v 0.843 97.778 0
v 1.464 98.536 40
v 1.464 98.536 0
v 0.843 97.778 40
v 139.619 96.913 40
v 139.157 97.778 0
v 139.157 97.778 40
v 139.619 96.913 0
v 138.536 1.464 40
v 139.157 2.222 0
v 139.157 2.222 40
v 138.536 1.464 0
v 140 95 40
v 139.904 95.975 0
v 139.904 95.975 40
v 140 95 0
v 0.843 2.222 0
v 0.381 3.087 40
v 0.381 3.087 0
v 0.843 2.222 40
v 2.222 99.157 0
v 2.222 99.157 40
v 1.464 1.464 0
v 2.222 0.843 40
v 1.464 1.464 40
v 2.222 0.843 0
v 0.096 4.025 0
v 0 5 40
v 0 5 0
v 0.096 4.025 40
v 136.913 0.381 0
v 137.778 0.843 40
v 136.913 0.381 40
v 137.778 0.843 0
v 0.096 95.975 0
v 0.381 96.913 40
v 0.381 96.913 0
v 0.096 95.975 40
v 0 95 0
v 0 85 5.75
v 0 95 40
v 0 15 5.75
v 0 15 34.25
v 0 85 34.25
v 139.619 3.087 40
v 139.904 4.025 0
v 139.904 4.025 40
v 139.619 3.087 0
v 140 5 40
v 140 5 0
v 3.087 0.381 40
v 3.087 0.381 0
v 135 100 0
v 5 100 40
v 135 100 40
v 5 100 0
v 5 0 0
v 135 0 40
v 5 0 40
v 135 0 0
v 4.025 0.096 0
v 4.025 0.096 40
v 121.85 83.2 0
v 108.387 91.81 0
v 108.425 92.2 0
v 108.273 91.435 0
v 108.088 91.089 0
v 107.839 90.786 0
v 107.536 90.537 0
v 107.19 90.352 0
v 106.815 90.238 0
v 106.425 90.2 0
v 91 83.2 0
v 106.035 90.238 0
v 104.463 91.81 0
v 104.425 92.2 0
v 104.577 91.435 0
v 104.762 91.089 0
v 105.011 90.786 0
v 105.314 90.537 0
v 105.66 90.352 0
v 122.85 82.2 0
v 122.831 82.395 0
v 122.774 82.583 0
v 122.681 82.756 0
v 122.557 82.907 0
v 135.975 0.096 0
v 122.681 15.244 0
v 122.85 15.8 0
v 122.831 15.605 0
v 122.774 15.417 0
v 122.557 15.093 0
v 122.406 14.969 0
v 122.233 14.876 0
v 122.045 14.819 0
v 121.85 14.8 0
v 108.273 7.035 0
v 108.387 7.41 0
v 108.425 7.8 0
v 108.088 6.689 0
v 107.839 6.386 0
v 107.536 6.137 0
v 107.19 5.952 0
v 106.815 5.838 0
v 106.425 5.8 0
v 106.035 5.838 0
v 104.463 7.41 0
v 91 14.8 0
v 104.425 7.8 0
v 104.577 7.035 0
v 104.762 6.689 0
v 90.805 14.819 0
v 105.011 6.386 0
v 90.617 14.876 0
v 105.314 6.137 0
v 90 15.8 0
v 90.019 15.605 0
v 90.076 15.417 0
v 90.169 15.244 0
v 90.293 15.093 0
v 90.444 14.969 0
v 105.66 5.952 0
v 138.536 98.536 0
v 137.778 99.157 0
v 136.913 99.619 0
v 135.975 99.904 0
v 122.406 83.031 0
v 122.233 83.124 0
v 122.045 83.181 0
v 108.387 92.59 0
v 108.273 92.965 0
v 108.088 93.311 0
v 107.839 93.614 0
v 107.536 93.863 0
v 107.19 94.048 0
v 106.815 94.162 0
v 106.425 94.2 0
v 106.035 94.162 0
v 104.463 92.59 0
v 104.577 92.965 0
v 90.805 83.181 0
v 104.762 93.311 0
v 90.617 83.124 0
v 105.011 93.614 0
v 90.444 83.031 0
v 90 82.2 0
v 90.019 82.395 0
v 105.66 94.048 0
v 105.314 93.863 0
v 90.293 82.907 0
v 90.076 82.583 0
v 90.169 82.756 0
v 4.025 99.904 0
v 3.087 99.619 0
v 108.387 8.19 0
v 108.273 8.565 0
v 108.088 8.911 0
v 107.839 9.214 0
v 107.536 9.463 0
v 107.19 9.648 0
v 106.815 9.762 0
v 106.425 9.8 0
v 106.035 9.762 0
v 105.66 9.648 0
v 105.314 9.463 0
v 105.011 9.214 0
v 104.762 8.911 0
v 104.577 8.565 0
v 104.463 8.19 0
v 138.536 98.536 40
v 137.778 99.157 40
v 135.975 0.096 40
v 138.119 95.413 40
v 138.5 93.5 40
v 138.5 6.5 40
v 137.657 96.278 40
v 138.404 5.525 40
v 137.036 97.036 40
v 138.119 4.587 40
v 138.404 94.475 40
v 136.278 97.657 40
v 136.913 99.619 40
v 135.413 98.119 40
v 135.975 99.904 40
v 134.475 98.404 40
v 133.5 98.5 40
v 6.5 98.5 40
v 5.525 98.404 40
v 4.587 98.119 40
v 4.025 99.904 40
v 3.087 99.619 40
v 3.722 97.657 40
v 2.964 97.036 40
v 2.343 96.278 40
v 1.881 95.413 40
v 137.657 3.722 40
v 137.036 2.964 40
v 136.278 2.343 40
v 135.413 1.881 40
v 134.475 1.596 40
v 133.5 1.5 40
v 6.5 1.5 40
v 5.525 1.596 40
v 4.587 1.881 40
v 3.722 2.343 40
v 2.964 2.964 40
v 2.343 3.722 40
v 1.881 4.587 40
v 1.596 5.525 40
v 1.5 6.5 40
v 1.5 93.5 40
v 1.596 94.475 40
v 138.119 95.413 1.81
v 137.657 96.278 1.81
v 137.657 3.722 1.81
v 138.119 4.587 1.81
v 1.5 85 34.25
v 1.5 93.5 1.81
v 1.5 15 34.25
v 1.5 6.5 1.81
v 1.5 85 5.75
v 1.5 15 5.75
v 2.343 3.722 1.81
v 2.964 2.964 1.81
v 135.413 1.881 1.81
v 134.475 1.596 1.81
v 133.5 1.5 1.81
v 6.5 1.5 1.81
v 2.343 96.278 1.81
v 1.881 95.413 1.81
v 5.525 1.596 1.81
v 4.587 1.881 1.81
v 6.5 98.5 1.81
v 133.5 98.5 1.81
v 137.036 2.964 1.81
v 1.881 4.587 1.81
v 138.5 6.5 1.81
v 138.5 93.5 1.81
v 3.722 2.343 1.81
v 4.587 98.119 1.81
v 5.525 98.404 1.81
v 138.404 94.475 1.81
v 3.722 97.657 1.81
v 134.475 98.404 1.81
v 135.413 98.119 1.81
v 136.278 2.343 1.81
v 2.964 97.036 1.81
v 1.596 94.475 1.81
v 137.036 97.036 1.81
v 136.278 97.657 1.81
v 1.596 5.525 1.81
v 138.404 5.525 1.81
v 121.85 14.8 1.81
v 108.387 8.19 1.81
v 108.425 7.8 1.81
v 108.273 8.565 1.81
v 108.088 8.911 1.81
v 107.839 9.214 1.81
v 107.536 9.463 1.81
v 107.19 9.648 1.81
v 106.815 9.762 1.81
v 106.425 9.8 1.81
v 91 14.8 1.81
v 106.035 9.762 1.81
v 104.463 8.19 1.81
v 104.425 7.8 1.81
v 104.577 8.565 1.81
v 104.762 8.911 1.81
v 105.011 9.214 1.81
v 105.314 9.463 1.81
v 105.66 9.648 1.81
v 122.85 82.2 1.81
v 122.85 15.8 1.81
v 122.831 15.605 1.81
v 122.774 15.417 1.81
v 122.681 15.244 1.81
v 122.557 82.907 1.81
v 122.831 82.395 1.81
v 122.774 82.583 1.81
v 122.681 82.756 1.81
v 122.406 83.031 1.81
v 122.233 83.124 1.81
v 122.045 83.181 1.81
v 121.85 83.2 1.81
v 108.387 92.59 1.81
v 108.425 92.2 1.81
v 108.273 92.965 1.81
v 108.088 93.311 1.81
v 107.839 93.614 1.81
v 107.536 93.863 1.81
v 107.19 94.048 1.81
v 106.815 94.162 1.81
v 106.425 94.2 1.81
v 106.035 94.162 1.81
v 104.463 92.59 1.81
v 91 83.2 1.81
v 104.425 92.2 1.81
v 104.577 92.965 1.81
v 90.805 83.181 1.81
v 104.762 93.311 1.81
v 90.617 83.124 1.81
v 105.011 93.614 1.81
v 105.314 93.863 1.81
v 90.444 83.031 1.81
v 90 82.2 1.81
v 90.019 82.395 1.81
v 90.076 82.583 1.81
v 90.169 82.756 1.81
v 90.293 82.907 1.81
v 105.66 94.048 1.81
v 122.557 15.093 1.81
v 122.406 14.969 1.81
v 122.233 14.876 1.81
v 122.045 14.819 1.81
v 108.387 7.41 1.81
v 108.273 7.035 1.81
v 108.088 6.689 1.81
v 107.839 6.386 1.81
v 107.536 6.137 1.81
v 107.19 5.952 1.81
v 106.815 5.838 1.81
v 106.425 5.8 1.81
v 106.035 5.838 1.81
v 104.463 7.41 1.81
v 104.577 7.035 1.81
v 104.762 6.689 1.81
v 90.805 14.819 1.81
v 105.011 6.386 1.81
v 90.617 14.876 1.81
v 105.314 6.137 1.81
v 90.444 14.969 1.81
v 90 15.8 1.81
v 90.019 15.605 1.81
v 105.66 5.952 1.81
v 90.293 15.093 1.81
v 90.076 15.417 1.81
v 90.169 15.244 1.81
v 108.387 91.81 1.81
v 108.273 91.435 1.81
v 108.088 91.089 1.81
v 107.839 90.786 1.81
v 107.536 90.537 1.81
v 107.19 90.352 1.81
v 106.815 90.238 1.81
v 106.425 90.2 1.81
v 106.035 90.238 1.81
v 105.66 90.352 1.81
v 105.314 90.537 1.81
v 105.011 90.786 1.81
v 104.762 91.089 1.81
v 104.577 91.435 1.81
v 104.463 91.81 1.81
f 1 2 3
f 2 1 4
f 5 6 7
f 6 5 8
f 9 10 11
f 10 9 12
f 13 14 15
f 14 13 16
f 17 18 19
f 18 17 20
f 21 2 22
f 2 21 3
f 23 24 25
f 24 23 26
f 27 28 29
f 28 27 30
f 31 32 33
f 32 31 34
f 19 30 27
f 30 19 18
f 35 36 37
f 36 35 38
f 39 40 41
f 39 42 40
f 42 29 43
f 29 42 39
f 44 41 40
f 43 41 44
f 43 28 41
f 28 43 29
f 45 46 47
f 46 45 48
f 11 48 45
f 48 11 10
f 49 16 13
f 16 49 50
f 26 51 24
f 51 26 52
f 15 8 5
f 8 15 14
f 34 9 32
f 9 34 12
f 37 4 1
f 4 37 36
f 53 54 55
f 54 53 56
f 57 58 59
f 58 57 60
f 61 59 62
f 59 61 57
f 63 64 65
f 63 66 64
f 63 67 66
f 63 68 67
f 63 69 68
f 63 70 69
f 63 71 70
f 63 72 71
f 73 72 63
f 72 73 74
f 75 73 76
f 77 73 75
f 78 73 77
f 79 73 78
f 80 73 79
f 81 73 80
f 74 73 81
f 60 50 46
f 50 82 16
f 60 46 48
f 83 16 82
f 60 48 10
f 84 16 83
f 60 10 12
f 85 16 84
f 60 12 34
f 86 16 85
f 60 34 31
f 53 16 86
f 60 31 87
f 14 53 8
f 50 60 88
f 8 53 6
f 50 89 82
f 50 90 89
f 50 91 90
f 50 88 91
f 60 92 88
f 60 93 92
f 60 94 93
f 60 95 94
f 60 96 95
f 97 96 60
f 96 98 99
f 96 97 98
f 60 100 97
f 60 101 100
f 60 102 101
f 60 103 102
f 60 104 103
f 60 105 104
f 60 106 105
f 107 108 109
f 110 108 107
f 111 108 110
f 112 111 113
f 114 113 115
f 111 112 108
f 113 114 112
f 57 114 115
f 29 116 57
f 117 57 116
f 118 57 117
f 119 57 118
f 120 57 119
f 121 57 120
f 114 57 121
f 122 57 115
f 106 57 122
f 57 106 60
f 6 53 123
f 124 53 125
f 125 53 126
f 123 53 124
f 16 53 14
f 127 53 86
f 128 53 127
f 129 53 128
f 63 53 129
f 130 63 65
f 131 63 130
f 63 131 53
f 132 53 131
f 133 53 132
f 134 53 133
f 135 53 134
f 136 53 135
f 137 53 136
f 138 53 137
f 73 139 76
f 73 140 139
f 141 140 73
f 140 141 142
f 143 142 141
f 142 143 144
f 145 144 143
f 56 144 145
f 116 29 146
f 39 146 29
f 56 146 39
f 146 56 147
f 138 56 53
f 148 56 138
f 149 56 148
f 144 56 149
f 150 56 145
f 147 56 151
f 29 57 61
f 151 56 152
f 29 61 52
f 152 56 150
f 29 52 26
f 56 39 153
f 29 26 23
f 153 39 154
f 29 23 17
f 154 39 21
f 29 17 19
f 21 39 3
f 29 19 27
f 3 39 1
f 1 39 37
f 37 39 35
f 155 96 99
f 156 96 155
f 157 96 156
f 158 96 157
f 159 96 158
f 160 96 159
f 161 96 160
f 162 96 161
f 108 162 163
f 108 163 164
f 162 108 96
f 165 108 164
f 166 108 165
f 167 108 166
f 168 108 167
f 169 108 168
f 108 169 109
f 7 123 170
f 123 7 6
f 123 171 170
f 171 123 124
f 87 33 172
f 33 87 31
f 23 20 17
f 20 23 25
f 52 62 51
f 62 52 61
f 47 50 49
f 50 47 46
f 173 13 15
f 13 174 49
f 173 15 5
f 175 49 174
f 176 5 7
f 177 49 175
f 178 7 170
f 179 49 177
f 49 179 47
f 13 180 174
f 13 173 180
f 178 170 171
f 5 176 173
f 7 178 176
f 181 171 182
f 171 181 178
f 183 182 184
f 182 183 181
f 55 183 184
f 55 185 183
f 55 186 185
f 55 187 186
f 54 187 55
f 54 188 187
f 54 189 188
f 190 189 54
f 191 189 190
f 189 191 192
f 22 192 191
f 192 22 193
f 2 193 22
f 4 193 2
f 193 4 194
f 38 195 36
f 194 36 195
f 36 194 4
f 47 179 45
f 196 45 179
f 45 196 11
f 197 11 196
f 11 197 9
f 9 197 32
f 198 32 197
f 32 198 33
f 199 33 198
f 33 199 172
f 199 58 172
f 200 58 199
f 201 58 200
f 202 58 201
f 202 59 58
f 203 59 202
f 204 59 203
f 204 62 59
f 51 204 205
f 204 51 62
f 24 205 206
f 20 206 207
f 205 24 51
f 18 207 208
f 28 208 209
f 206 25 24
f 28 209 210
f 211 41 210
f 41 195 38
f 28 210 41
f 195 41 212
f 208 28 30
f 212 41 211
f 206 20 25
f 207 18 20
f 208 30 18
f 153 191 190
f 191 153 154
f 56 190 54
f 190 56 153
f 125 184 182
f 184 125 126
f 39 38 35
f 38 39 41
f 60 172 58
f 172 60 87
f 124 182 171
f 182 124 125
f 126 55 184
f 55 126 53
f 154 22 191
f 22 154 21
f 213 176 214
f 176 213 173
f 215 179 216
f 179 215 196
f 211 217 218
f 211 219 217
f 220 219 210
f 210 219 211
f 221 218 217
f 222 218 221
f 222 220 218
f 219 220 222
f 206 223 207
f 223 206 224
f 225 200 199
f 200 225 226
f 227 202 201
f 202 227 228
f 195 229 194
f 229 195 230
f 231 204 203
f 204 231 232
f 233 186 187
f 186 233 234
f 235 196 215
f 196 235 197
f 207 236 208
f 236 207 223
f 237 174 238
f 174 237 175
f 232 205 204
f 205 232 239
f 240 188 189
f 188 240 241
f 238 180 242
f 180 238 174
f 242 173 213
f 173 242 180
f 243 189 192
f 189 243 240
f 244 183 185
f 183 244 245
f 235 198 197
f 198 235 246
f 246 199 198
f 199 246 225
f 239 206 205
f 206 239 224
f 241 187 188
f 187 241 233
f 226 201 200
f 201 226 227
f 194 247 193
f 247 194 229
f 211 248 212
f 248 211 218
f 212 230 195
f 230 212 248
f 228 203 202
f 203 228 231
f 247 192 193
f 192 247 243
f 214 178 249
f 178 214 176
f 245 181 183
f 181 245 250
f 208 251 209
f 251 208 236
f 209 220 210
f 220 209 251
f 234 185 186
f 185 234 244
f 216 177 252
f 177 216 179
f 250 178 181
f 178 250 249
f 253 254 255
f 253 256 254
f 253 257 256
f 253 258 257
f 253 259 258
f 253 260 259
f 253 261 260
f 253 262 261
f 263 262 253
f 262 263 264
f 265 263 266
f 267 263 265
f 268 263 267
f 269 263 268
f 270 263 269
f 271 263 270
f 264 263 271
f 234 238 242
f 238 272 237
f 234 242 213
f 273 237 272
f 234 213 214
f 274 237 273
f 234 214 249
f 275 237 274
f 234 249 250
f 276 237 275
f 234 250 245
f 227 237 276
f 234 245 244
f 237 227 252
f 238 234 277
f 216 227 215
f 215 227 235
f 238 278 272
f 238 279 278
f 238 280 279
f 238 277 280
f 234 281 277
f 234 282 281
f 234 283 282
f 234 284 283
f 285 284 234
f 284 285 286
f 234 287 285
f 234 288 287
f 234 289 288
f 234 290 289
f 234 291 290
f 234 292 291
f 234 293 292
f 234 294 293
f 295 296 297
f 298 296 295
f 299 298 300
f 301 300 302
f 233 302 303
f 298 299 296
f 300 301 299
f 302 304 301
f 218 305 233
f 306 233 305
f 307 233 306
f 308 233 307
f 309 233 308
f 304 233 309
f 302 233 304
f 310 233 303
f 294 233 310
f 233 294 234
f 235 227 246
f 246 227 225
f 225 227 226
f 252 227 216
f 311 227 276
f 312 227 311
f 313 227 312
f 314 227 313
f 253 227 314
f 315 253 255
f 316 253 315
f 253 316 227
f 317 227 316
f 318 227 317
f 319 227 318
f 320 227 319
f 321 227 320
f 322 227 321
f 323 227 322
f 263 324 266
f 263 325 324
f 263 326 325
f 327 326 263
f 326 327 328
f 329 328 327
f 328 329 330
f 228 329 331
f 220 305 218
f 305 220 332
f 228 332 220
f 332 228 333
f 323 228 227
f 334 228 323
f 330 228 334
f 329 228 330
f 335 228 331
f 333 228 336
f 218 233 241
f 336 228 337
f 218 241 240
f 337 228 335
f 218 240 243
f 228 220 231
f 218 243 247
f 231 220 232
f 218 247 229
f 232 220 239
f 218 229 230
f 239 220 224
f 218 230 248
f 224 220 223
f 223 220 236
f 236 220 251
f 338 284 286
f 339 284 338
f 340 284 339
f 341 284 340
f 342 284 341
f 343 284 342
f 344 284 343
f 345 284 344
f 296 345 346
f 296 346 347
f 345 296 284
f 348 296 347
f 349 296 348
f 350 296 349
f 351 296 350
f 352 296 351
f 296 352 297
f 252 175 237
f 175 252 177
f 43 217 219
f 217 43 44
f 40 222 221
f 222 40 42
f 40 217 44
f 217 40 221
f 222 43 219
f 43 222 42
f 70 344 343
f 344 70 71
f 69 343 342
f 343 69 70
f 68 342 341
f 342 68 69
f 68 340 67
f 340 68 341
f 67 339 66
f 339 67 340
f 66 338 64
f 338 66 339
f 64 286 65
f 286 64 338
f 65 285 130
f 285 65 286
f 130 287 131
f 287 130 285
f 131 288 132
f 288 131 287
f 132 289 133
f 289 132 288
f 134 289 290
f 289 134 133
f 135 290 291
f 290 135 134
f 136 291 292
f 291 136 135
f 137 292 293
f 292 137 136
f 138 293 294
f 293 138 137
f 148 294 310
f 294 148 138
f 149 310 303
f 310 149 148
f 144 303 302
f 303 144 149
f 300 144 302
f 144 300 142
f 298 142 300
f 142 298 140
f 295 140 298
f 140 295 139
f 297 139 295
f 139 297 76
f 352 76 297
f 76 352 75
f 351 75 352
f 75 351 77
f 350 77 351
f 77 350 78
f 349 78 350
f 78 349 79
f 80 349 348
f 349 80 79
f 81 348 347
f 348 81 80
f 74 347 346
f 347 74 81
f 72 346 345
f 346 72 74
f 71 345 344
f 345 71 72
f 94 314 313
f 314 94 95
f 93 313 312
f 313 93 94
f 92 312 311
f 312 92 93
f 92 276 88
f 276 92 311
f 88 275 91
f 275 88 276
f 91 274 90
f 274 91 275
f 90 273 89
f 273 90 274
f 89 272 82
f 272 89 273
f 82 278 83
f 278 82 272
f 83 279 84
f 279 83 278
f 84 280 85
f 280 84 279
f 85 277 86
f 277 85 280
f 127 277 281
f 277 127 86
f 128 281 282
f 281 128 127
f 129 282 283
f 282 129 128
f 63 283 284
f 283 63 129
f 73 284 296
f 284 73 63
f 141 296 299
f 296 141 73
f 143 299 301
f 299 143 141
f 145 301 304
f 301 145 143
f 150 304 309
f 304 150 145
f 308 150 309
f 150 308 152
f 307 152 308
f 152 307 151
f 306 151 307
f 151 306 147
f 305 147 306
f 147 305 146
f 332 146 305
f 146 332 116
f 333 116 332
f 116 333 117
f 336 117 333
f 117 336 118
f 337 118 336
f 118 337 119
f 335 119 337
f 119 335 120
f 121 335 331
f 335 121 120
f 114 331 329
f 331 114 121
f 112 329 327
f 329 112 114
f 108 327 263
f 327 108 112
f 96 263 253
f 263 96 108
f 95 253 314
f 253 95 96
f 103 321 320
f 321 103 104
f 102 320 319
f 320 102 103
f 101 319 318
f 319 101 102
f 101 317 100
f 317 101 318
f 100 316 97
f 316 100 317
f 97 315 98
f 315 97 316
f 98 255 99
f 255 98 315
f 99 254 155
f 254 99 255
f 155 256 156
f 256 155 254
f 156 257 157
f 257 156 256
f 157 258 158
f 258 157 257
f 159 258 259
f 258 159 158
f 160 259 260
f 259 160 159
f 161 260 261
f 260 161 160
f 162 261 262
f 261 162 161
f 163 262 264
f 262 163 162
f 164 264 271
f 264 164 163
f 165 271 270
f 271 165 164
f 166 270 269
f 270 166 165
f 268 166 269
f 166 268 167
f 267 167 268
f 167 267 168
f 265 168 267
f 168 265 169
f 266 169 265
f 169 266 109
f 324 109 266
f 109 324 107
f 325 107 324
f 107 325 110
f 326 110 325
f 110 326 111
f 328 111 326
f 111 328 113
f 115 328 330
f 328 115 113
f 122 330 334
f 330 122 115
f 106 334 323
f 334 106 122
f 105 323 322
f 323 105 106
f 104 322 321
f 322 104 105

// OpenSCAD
// file: temp_control_box.scad
include <config.scad>

module temp_control_box()
{
    cube(size=[temp_control_bezel_t, temp_control_bezel_w, temp_control_bezel_h]);
    translate([-pad, (temp_control_bezel_w - temp_control_box_y) / 2, (temp_control_bezel_h - temp_control_box_z) / 2])
        cube(size=[temp_control_box_x, temp_control_box_y, temp_control_box_z]);
}
// file: config.scad
pad = 0.01;
smooth = 32;

$fn = smooth;

// 3d printer configuration (try to match slicer settings)
nozzle_width = 0.6;
layer_h = 0.3;
perimeters = 5;

// Calculate box/plate thicknesses using printer settings
box_plate_t = 6 * layer_h;
box_wall_t = perimeters * nozzle_width;

box_w = 100;
box_l = 140;
box_h = 40;

power_box_x = 32.85;
power_box_y = 68.40;
power_box_z = 25.65;
power_box_ri = 2;
power_box_ro = 4;
power_box_hole_offset = 8;
power_box_full_w = power_box_y + 2*power_box_ro + 2*power_box_hole_offset;

temp_control_box_x = 74.5;
temp_control_box_y = 70;
temp_control_box_z = 28.5;
temp_control_bezel_w = 75;
temp_control_bezel_h = 34.5;
temp_control_bezel_t = 3.5;
// file: power_box.scad
include <config.scad>

module power_box()
{
    translate([1, power_box_hole_offset + power_box_ro, 0])
        linear_extrude(height=power_box_z)
            union(){
                minkowski(){
                    square([power_box_x - 2, power_box_y - 2]);
                    circle(r=1);
                }

                translate([(power_box_x - 2) / 2, -power_box_hole_offset, 0])
                    circle(r=power_box_ri);
                    *difference()
                    {
                        circle(r=power_box_ro);
                        circle(r=power_box_ri);
                    }

                translate([(power_box_x - 2) / 2, power_box_y + power_box_hole_offset, 0])
                    circle(r=power_box_ri);
                    *difference()
                    {
                        circle(r=power_box_ro);
                        circle(r=power_box_ri);
                    }
            }

    *square([power_box_x, power_box_full_w]);
}
// file: box.scad
include <config.scad>
use <temp_control_box.scad>
use <power_box.scad>

module box_bottom()
{
    difference(){
        rounded_shell();

        // create a hole for the temperature controller
        #translate([-temp_control_bezel_t-pad,(box_w - temp_control_bezel_w)/2,(box_h - temp_control_bezel_h)/2])
            temp_control_box();

        #translate([90, (box_w - power_box_full_w)/2, -pad])
            power_box();
    }
}

module box_shell()
{
    difference(){
        // the main box (the bottom portion)
        cube(size=[box_l,box_w,box_h]);

        // hollow the interior/top of the box
        translate([box_wall_t/2, box_wall_t/2,box_plate_t + pad])
            cube(size=[box_l - box_wall_t, box_w - box_wall_t, box_h - box_plate_t]);
    }
}

module rounded_shell()
{
    difference(){
        // the main box (the bottom portion)
        rounded_cube(size=[box_l,box_w,box_h], r=5);

        // hollow the interior/top of the box
        translate([box_wall_t/2, box_wall_t/2,box_plate_t + pad])
            rounded_cube(size=[box_l - box_wall_t, box_w - box_wall_t, box_h - box_plate_t], r=5);
    }
}

module rounded_cube(size=[5, 5, 5], r=1)
{
    translate([r,r])
        linear_extrude(height=size[2])
            minkowski()
            {
                square([size[0]-2*r, size[1]-2*r]);
                circle(r=r);
            }
}
// main file
use <box.scad>
use <power_box.scad>

// the bottom half
box_bottom();

// object "designer"
//!power_box();
